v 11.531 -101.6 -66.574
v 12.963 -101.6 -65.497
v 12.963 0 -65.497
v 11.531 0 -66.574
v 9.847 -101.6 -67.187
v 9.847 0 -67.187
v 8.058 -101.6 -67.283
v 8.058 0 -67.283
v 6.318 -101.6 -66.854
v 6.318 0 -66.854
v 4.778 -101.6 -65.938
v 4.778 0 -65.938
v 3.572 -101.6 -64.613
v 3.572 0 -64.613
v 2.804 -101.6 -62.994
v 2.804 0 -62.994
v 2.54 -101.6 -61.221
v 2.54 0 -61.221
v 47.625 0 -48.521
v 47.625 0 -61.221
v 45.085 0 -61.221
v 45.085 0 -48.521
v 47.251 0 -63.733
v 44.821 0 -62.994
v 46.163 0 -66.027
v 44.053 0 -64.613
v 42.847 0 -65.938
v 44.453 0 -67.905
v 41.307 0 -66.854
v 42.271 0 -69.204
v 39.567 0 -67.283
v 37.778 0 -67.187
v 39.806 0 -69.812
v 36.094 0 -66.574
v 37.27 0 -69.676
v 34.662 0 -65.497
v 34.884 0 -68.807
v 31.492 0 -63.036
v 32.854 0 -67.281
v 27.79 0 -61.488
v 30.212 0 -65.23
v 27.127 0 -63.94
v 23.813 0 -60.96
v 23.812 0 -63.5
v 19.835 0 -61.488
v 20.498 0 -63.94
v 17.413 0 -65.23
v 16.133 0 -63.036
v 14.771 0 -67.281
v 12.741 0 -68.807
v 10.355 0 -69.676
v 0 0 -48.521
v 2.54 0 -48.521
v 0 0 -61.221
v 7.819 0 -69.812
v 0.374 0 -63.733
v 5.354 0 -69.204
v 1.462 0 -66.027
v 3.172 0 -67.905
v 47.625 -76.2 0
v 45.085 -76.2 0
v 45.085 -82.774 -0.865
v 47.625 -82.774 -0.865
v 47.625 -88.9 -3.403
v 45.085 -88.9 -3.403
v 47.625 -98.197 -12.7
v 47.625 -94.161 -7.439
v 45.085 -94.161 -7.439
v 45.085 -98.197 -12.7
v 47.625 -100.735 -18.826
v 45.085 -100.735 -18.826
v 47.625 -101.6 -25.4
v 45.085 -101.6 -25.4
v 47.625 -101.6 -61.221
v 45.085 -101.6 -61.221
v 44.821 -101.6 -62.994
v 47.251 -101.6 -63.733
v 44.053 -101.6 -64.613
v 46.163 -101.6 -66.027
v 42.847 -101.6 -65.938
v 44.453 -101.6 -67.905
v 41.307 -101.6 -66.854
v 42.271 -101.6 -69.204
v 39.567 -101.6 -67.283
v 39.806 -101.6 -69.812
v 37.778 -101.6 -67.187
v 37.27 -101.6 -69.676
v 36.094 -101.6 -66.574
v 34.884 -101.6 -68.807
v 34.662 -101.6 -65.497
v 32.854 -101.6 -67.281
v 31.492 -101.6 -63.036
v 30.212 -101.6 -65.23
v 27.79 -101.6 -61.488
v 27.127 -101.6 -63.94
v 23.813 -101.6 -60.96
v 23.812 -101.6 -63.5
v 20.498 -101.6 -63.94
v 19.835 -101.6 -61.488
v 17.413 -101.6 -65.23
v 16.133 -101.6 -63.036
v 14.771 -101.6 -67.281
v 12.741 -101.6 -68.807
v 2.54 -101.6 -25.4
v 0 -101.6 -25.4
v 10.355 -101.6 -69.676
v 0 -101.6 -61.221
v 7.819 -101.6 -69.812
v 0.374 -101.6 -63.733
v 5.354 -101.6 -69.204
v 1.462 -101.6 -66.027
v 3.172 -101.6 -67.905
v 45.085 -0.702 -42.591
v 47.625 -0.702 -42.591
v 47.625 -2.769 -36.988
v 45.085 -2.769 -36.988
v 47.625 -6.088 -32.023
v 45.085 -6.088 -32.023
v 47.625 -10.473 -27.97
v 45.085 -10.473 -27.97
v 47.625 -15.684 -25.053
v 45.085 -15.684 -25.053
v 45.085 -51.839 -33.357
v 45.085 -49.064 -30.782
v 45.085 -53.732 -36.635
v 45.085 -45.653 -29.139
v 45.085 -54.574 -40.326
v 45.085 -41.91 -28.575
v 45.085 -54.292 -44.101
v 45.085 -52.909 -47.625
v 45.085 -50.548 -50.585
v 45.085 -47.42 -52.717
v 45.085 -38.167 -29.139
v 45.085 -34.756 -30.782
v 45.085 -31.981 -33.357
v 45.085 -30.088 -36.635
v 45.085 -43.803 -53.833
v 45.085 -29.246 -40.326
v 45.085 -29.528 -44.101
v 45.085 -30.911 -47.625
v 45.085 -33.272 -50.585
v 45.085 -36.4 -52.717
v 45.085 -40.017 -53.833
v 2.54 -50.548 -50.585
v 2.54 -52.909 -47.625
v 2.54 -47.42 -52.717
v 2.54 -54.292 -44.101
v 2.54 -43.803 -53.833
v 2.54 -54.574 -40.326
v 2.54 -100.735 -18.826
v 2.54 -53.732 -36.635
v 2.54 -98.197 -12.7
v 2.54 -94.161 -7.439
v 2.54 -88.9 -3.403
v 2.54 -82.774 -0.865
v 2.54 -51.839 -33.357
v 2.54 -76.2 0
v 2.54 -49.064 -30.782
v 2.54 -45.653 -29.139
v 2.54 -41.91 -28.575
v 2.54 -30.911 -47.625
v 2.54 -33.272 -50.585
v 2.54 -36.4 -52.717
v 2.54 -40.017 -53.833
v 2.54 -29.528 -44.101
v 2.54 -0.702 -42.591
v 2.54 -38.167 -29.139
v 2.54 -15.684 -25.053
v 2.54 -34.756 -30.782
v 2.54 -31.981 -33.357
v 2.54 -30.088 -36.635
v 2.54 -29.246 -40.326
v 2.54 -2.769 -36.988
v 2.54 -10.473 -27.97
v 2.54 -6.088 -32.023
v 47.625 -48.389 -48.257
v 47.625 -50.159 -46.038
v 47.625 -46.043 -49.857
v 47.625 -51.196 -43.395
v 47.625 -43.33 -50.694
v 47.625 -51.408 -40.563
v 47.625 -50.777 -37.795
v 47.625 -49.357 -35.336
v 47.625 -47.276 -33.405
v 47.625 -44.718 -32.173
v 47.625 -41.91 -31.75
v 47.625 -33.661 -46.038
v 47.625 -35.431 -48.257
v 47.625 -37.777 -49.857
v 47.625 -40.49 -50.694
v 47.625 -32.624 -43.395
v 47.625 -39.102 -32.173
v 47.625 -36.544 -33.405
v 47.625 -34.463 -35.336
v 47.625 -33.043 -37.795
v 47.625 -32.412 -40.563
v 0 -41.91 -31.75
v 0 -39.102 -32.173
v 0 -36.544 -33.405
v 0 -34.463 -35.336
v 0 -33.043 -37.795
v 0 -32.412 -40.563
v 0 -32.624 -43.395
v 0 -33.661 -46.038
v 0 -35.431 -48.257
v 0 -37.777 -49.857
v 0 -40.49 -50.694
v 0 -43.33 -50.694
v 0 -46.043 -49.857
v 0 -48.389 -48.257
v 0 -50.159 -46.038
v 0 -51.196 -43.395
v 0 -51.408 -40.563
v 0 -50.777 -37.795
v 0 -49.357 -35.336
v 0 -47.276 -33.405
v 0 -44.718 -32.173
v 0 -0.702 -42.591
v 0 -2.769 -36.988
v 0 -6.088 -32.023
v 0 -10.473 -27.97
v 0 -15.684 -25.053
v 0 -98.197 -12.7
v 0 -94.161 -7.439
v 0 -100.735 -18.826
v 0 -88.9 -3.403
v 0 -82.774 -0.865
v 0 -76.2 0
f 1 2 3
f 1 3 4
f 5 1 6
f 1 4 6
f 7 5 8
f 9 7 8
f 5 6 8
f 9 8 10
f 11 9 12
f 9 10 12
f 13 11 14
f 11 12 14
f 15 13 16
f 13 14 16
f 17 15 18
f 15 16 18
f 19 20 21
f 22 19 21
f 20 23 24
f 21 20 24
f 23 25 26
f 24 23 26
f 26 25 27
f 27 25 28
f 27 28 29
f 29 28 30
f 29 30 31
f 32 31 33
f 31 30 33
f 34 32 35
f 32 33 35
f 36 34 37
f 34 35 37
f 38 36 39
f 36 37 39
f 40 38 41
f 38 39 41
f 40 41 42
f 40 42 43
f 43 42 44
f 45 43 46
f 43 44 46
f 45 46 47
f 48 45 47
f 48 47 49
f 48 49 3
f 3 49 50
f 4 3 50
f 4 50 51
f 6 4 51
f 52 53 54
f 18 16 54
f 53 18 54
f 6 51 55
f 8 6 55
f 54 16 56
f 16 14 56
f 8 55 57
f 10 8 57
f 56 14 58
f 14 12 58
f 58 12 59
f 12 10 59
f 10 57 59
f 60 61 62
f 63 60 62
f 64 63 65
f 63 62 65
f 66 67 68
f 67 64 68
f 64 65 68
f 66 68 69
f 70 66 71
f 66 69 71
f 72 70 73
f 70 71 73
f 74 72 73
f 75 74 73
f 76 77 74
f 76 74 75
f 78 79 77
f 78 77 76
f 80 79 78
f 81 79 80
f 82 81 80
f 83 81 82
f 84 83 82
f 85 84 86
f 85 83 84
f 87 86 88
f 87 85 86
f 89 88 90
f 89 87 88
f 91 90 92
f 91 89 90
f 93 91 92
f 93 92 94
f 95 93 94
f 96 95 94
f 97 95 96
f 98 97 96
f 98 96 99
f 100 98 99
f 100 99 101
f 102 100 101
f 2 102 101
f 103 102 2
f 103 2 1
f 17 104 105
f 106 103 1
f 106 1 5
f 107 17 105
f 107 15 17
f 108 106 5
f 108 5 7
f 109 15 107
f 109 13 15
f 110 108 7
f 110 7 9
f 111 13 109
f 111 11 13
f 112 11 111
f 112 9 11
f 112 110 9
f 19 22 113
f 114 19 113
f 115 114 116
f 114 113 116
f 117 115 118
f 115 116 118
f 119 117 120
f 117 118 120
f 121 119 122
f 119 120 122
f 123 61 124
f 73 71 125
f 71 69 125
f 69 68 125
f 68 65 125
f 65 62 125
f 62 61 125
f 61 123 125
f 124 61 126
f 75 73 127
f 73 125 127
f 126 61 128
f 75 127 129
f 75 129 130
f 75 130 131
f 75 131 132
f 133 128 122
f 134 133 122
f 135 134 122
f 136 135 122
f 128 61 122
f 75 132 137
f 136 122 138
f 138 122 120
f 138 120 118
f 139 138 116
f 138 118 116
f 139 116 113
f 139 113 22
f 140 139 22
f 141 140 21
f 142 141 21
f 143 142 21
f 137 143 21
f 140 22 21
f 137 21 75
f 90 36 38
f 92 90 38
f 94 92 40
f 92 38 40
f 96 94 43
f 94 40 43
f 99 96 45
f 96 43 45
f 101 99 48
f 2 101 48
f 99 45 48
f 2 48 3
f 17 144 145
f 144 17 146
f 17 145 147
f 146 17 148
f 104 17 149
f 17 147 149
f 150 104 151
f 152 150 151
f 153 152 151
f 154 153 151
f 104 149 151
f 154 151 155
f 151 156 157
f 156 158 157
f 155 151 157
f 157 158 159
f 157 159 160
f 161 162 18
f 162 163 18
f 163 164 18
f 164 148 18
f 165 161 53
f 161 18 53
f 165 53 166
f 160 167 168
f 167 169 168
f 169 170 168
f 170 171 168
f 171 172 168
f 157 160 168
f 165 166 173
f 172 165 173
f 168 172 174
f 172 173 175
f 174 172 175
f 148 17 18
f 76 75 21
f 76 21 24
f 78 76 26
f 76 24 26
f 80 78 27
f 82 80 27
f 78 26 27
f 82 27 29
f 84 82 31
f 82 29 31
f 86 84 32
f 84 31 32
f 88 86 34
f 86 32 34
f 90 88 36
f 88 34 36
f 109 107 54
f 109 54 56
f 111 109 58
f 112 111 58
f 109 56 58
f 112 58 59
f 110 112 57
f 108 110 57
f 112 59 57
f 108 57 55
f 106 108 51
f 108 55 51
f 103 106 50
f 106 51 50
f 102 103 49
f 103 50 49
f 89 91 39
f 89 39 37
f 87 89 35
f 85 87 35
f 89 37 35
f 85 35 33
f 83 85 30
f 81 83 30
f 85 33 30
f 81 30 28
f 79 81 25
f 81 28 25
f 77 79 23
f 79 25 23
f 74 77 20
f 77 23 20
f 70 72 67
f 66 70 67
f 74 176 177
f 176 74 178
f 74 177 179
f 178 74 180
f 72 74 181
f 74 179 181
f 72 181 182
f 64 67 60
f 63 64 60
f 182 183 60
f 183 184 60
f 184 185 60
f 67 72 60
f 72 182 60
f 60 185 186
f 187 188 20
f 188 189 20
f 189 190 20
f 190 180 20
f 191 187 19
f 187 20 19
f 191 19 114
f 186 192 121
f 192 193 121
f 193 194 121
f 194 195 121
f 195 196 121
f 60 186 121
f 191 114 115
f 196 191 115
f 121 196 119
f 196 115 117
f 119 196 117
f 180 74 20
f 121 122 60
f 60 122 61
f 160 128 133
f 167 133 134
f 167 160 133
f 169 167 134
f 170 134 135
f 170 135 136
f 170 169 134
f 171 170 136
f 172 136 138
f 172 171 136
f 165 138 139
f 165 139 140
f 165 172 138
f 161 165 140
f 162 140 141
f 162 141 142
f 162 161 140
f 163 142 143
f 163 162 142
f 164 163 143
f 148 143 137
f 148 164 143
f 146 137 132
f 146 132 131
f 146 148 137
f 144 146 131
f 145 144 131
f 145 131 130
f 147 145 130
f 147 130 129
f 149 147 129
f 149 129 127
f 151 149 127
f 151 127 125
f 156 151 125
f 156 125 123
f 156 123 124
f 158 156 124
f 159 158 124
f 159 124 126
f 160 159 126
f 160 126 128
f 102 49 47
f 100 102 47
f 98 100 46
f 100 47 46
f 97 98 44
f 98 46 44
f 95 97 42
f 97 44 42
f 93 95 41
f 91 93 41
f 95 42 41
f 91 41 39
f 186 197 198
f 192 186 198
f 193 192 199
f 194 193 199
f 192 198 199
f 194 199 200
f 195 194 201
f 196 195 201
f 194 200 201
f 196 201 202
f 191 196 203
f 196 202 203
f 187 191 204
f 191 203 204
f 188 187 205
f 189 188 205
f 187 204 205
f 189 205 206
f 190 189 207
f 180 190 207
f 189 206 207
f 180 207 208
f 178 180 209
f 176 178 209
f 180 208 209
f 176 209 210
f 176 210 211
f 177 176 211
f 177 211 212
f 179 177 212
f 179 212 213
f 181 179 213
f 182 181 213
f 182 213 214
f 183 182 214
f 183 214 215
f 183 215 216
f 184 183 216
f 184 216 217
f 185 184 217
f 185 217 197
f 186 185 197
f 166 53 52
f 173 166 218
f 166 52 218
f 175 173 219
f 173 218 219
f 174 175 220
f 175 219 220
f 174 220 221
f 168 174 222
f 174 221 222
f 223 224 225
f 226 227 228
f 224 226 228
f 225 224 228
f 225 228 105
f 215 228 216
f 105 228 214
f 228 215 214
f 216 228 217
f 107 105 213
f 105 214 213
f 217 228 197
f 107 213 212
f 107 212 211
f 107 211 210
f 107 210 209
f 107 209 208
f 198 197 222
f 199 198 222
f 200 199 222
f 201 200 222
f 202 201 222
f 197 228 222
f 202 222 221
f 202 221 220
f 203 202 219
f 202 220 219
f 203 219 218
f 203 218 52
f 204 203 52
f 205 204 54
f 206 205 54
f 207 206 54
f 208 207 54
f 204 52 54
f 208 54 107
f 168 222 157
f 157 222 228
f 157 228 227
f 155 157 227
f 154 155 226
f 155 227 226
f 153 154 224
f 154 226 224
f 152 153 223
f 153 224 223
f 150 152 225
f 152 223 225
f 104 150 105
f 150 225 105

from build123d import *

# Parameters (mm, degrees)
EXTRUDE_THIN1_DEPTH = 101.6
SKETCH3_R           = 9.525
EXTRUDE1_DEPTH      = 101.6
SKETCH2_R           = 12.7
SKETCH2_R_2         = 9.525
EXTRUDE2_DEPTH      = 45.085
EXTRUDE3_DEPTH      = 101.6


with BuildPart() as part:
    # Sketch1 → Extrude-Thin1 (new body)
    with BuildSketch(Plane(origin=(0, 0, 0), x_dir=(1, 0, 0), z_dir=(0, 1, 0))):
        with BuildLine():
            Line((0, 0), (0, 61.221397696))
            ThreePointArc((0, 61.221397696), (5.35372705, 69.204377703), (14.771330869, 67.281072892))
            ThreePointArc((14.771330869, 67.281072892), (23.8125, 63.5), (32.853669131, 67.281072892))
            ThreePointArc((32.853669131, 67.281072892), (42.27127295, 69.204377703), (47.625, 61.221397696))
            Line((47.625, 61.221397696), (47.625, 0))
            Line((47.625, 0), (45.085, 0))
            Line((45.085, 0), (45.085, 61.221397696))
            ThreePointArc((45.085, 61.221397696), (41.307248552, 66.854429414), (34.661902957, 65.497287471))
            ThreePointArc((34.661902957, 65.497287471), (23.8125, 60.96), (12.963097043, 65.497287471))
            ThreePointArc((12.963097043, 65.497287471), (6.317751448, 66.854429414), (2.54, 61.221397696))
            Line((2.54, 61.221397696), (2.54, 0))
            Line((2.54, 0), (0, 0))
        make_face()
    extrude(amount=-EXTRUDE_THIN1_DEPTH)

    # Sketch3 → Extrude1 (cut)
    with BuildSketch(Plane.ZY):
        with Locations((-41.275, -41.91)):
            Circle(SKETCH3_R)
    extrude(amount=-EXTRUDE1_DEPTH, mode=Mode.SUBTRACT)

    # Sketch2 → Extrude2 (add)
    with BuildSketch(Plane.ZY):
        with Locations((-41.275, -41.91)):
            Circle(SKETCH2_R)
        with Locations((-41.275, -41.91)):
            Circle(SKETCH2_R_2, mode=Mode.SUBTRACT)
    extrude(amount=-EXTRUDE2_DEPTH)

    # Sketch4 → Extrude3 (cut)
    with BuildSketch(Plane.ZY):
        with BuildLine():
            Line((-25.053018977, -15.684280765), (0, -76.2))
            Line((0, -76.2), (0, 0))
            Line((0, 0), (-48.521397696, 0))
            ThreePointArc((-48.521397696, 0), (-34.407915996, -4.282006859), (-25.053018977, -15.684280765))
        make_face()
        with BuildLine():
            ThreePointArc((0, -76.2), (-7.439487758, -94.160512242), (-25.4, -101.6))
            Line((-25.4, -101.6), (0, -101.6))
            Line((0, -101.6), (0, -76.2))
        make_face()
    extrude(amount=-EXTRUDE3_DEPTH, mode=Mode.SUBTRACT)


solid = part.part
